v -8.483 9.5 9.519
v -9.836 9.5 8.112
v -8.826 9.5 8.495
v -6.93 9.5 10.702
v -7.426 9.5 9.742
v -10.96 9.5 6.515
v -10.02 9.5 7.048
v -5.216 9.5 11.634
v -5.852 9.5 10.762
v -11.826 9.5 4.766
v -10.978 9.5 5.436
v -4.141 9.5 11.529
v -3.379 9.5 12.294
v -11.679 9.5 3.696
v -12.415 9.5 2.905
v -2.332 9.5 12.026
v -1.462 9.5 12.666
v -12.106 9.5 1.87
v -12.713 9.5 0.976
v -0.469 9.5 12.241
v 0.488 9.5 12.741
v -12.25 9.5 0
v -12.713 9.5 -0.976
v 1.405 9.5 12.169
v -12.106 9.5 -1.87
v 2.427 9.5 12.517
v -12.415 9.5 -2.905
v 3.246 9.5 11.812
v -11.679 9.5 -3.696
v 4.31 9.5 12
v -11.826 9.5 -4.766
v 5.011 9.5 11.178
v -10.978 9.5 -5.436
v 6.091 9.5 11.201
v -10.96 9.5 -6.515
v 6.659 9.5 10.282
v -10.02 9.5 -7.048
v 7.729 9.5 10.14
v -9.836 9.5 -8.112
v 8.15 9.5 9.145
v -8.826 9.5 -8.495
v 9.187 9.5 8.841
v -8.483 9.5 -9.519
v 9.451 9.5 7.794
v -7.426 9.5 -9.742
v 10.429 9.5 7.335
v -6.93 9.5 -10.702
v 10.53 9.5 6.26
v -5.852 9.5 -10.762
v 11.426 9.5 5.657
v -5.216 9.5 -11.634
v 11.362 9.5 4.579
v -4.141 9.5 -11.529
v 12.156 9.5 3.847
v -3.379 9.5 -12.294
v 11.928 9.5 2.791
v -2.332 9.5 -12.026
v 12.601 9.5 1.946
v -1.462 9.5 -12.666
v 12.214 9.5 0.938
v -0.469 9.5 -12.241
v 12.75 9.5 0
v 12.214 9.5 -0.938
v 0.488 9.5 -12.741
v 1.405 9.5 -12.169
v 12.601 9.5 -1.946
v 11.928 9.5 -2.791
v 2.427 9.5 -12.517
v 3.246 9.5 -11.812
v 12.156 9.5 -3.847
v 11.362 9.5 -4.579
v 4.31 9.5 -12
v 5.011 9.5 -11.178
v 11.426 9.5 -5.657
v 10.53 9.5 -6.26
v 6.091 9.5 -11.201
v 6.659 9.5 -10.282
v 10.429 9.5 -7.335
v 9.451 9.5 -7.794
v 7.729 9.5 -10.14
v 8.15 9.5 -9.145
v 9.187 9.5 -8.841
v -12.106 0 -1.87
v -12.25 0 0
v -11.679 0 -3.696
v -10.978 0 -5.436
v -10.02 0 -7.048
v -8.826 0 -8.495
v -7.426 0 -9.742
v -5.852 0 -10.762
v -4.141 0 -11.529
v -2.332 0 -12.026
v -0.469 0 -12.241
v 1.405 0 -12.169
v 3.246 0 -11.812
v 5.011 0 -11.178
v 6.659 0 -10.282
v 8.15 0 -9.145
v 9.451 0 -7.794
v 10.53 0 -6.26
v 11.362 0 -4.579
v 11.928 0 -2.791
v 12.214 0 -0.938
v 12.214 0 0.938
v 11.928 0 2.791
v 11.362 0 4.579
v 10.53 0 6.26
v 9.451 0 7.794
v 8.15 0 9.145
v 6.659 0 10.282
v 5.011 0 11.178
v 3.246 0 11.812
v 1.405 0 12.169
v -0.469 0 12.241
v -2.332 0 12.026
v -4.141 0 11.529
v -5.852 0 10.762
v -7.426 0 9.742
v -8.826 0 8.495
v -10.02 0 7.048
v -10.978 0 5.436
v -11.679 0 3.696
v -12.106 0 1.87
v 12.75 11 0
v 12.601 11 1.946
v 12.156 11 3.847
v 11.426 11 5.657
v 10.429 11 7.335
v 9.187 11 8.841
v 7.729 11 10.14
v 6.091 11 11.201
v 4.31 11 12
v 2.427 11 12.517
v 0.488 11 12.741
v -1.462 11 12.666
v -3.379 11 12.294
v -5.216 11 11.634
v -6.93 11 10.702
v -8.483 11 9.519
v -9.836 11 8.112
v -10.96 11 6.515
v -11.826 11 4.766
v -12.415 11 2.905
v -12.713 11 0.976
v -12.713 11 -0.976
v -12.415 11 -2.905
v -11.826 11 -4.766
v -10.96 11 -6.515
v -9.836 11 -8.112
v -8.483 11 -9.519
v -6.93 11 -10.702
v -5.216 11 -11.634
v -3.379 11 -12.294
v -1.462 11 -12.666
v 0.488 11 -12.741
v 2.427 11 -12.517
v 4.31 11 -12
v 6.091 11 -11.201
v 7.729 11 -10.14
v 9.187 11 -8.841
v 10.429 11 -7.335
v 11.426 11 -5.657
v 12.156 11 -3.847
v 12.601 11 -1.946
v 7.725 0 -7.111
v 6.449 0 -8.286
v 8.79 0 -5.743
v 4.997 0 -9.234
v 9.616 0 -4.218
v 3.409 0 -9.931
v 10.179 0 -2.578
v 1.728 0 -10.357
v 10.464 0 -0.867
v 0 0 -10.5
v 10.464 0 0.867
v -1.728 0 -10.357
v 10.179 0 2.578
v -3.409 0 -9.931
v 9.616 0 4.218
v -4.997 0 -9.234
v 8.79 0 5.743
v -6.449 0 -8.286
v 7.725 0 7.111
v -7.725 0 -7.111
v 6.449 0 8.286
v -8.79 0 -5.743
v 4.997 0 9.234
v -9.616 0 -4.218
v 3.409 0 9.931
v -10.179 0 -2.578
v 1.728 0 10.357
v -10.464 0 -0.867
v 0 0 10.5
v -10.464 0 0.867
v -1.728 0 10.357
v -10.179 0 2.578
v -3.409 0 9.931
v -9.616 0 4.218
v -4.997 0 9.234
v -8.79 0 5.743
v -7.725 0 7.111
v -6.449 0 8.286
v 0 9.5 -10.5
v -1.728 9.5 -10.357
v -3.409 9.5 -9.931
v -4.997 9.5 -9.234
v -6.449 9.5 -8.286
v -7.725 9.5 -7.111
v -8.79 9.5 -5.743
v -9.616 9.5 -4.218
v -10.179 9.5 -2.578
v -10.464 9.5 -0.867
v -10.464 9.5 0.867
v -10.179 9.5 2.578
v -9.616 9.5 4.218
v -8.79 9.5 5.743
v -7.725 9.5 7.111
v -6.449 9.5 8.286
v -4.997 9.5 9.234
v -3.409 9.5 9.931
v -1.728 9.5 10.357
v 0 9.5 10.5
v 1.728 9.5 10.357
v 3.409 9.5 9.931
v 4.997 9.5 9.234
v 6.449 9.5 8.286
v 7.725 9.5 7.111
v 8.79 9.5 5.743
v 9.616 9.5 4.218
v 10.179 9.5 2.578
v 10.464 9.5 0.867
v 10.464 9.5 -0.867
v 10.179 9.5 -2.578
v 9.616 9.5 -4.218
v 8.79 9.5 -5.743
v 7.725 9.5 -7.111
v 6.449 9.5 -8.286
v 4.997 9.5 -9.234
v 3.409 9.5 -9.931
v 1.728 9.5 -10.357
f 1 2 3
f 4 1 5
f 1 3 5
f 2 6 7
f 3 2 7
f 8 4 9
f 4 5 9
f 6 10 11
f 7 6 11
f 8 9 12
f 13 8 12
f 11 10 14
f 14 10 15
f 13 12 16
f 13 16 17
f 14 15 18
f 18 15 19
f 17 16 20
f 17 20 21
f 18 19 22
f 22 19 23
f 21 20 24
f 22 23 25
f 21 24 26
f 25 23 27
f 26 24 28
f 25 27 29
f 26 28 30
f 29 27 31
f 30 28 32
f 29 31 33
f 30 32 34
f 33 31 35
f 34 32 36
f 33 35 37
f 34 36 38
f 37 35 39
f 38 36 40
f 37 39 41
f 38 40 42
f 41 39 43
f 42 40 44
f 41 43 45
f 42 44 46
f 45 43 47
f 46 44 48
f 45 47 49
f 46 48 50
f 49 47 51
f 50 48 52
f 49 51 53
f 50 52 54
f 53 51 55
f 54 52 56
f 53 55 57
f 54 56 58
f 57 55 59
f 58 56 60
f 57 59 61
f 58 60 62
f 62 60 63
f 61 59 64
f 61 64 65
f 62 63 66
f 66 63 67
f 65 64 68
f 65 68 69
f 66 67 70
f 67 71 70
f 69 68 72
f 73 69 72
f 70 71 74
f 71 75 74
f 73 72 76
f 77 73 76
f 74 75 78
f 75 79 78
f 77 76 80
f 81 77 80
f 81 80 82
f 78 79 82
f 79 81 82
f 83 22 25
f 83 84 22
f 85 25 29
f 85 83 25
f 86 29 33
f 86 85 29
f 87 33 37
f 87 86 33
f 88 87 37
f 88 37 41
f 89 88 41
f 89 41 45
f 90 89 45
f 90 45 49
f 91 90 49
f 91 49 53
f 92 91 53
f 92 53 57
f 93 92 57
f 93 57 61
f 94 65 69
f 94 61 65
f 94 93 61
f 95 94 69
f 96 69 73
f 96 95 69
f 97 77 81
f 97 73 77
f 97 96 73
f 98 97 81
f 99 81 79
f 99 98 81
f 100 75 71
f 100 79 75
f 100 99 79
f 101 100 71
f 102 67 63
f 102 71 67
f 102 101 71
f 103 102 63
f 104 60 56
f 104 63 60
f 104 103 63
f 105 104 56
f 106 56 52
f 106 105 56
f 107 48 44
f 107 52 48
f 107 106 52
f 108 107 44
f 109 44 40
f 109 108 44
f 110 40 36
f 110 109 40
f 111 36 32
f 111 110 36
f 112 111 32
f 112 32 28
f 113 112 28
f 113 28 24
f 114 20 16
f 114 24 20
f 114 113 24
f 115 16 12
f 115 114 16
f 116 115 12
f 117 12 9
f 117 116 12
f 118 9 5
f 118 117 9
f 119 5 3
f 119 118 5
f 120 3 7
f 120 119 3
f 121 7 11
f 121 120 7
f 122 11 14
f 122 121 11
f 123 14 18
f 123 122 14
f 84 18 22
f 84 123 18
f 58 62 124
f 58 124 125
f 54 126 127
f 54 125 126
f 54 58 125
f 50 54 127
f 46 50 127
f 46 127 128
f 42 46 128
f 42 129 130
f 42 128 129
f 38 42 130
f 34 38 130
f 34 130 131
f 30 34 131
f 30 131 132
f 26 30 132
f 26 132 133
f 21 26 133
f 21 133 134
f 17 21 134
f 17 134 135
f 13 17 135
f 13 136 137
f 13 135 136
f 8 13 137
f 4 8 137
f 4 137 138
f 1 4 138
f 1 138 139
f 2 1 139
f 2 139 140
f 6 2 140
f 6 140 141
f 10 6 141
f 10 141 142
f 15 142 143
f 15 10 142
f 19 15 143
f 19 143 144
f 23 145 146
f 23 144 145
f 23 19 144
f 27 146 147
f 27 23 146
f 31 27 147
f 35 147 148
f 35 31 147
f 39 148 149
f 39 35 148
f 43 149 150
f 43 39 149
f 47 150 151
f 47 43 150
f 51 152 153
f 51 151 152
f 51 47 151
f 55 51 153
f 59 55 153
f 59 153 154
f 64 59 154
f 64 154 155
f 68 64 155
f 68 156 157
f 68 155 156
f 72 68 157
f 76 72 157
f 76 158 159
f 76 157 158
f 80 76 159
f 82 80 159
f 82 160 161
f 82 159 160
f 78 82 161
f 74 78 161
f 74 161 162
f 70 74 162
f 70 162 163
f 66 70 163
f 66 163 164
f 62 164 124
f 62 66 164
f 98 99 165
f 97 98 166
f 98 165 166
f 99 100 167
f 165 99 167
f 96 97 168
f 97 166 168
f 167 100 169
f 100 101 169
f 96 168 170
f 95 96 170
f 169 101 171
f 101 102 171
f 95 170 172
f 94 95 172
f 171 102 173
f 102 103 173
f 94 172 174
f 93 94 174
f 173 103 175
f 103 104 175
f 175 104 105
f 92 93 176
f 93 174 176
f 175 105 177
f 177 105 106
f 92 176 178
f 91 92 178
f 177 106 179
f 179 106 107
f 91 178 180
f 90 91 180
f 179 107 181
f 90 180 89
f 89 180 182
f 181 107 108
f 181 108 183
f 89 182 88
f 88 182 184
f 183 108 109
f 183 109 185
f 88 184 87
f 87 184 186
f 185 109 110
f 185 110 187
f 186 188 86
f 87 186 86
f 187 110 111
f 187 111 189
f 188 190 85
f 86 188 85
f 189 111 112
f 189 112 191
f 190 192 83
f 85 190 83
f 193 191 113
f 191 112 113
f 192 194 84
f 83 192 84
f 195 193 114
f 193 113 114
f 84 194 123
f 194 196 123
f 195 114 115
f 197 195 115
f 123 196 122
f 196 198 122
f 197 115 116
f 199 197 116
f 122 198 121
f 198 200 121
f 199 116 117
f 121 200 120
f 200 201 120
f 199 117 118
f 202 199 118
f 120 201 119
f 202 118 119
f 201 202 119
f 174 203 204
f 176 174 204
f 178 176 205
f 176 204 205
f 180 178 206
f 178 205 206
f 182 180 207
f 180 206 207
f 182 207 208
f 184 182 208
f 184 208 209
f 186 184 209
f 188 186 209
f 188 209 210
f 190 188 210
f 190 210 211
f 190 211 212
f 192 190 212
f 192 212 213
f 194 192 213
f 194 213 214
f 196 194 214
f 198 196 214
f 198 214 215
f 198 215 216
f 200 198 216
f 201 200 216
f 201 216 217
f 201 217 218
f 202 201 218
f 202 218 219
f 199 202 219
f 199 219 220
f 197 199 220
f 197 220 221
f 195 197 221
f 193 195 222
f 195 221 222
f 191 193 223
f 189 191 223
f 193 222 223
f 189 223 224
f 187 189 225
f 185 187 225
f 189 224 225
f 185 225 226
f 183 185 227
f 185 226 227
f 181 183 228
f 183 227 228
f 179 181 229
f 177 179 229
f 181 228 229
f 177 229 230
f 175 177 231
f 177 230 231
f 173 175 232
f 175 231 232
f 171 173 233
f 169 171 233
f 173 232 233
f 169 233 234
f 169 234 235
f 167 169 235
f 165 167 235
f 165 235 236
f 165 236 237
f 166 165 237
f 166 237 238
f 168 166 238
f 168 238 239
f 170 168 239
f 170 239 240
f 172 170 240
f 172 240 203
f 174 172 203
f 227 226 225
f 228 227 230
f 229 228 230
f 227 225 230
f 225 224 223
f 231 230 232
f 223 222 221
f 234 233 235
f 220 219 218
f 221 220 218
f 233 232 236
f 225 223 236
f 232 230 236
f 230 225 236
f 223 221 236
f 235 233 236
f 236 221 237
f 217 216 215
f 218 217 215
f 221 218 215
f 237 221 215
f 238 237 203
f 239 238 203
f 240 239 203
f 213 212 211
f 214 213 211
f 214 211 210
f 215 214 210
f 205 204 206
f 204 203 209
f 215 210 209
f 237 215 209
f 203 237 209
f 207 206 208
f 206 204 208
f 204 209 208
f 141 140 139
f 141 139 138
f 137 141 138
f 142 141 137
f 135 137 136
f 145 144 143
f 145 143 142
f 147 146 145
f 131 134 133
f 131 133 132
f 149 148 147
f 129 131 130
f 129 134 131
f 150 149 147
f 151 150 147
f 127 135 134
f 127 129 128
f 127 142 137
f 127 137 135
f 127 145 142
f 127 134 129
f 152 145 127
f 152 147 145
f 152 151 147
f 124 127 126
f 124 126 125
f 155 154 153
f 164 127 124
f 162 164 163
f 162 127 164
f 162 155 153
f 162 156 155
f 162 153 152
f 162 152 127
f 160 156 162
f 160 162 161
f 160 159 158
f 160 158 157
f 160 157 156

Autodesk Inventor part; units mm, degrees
ref_plane "YZ Plane" through (0, 0, 0) normal (1, 0, 0) x (0, 1, 0)
ref_plane "XZ Plane" through (0, 0, 0) normal (0, 1, 0) x (-1, 0, 0)
ref_plane "XY Plane" through (0, 0, 0) normal (0, 0, 1) x (1, 0, 0)
sketch "Skizze1" plane through (0, 0, 0) normal (0, 1, 0) x (-1, 0, 0)
  circle A0 centre (0, 0) radius 12.25
  dimension "d0" = 24.5
extrude "Extrusion1" add sketch "Skizze1" along normal blind 9.5
sketch "Skizze2" plane through (0, 9.5, 0) normal (0, 1, 0) x (1, 0, 0)
  circle A0 centre (0, 0) radius 12.75
  dimension "d3" = 25.5
extrude "Extrusion2" add sketch "Skizze2" along normal blind 1.5
sketch "Skizze3" plane through (0, 0, 0) normal (0, -1, 0) x (1, 0, 0)
  circle A0 centre (0, 0) radius 12.25 projected
hole "Bohrung1" at (0, 0, 0) direction (0, 1, 0) diameter 21 depth 9.5
properties part number "17"
